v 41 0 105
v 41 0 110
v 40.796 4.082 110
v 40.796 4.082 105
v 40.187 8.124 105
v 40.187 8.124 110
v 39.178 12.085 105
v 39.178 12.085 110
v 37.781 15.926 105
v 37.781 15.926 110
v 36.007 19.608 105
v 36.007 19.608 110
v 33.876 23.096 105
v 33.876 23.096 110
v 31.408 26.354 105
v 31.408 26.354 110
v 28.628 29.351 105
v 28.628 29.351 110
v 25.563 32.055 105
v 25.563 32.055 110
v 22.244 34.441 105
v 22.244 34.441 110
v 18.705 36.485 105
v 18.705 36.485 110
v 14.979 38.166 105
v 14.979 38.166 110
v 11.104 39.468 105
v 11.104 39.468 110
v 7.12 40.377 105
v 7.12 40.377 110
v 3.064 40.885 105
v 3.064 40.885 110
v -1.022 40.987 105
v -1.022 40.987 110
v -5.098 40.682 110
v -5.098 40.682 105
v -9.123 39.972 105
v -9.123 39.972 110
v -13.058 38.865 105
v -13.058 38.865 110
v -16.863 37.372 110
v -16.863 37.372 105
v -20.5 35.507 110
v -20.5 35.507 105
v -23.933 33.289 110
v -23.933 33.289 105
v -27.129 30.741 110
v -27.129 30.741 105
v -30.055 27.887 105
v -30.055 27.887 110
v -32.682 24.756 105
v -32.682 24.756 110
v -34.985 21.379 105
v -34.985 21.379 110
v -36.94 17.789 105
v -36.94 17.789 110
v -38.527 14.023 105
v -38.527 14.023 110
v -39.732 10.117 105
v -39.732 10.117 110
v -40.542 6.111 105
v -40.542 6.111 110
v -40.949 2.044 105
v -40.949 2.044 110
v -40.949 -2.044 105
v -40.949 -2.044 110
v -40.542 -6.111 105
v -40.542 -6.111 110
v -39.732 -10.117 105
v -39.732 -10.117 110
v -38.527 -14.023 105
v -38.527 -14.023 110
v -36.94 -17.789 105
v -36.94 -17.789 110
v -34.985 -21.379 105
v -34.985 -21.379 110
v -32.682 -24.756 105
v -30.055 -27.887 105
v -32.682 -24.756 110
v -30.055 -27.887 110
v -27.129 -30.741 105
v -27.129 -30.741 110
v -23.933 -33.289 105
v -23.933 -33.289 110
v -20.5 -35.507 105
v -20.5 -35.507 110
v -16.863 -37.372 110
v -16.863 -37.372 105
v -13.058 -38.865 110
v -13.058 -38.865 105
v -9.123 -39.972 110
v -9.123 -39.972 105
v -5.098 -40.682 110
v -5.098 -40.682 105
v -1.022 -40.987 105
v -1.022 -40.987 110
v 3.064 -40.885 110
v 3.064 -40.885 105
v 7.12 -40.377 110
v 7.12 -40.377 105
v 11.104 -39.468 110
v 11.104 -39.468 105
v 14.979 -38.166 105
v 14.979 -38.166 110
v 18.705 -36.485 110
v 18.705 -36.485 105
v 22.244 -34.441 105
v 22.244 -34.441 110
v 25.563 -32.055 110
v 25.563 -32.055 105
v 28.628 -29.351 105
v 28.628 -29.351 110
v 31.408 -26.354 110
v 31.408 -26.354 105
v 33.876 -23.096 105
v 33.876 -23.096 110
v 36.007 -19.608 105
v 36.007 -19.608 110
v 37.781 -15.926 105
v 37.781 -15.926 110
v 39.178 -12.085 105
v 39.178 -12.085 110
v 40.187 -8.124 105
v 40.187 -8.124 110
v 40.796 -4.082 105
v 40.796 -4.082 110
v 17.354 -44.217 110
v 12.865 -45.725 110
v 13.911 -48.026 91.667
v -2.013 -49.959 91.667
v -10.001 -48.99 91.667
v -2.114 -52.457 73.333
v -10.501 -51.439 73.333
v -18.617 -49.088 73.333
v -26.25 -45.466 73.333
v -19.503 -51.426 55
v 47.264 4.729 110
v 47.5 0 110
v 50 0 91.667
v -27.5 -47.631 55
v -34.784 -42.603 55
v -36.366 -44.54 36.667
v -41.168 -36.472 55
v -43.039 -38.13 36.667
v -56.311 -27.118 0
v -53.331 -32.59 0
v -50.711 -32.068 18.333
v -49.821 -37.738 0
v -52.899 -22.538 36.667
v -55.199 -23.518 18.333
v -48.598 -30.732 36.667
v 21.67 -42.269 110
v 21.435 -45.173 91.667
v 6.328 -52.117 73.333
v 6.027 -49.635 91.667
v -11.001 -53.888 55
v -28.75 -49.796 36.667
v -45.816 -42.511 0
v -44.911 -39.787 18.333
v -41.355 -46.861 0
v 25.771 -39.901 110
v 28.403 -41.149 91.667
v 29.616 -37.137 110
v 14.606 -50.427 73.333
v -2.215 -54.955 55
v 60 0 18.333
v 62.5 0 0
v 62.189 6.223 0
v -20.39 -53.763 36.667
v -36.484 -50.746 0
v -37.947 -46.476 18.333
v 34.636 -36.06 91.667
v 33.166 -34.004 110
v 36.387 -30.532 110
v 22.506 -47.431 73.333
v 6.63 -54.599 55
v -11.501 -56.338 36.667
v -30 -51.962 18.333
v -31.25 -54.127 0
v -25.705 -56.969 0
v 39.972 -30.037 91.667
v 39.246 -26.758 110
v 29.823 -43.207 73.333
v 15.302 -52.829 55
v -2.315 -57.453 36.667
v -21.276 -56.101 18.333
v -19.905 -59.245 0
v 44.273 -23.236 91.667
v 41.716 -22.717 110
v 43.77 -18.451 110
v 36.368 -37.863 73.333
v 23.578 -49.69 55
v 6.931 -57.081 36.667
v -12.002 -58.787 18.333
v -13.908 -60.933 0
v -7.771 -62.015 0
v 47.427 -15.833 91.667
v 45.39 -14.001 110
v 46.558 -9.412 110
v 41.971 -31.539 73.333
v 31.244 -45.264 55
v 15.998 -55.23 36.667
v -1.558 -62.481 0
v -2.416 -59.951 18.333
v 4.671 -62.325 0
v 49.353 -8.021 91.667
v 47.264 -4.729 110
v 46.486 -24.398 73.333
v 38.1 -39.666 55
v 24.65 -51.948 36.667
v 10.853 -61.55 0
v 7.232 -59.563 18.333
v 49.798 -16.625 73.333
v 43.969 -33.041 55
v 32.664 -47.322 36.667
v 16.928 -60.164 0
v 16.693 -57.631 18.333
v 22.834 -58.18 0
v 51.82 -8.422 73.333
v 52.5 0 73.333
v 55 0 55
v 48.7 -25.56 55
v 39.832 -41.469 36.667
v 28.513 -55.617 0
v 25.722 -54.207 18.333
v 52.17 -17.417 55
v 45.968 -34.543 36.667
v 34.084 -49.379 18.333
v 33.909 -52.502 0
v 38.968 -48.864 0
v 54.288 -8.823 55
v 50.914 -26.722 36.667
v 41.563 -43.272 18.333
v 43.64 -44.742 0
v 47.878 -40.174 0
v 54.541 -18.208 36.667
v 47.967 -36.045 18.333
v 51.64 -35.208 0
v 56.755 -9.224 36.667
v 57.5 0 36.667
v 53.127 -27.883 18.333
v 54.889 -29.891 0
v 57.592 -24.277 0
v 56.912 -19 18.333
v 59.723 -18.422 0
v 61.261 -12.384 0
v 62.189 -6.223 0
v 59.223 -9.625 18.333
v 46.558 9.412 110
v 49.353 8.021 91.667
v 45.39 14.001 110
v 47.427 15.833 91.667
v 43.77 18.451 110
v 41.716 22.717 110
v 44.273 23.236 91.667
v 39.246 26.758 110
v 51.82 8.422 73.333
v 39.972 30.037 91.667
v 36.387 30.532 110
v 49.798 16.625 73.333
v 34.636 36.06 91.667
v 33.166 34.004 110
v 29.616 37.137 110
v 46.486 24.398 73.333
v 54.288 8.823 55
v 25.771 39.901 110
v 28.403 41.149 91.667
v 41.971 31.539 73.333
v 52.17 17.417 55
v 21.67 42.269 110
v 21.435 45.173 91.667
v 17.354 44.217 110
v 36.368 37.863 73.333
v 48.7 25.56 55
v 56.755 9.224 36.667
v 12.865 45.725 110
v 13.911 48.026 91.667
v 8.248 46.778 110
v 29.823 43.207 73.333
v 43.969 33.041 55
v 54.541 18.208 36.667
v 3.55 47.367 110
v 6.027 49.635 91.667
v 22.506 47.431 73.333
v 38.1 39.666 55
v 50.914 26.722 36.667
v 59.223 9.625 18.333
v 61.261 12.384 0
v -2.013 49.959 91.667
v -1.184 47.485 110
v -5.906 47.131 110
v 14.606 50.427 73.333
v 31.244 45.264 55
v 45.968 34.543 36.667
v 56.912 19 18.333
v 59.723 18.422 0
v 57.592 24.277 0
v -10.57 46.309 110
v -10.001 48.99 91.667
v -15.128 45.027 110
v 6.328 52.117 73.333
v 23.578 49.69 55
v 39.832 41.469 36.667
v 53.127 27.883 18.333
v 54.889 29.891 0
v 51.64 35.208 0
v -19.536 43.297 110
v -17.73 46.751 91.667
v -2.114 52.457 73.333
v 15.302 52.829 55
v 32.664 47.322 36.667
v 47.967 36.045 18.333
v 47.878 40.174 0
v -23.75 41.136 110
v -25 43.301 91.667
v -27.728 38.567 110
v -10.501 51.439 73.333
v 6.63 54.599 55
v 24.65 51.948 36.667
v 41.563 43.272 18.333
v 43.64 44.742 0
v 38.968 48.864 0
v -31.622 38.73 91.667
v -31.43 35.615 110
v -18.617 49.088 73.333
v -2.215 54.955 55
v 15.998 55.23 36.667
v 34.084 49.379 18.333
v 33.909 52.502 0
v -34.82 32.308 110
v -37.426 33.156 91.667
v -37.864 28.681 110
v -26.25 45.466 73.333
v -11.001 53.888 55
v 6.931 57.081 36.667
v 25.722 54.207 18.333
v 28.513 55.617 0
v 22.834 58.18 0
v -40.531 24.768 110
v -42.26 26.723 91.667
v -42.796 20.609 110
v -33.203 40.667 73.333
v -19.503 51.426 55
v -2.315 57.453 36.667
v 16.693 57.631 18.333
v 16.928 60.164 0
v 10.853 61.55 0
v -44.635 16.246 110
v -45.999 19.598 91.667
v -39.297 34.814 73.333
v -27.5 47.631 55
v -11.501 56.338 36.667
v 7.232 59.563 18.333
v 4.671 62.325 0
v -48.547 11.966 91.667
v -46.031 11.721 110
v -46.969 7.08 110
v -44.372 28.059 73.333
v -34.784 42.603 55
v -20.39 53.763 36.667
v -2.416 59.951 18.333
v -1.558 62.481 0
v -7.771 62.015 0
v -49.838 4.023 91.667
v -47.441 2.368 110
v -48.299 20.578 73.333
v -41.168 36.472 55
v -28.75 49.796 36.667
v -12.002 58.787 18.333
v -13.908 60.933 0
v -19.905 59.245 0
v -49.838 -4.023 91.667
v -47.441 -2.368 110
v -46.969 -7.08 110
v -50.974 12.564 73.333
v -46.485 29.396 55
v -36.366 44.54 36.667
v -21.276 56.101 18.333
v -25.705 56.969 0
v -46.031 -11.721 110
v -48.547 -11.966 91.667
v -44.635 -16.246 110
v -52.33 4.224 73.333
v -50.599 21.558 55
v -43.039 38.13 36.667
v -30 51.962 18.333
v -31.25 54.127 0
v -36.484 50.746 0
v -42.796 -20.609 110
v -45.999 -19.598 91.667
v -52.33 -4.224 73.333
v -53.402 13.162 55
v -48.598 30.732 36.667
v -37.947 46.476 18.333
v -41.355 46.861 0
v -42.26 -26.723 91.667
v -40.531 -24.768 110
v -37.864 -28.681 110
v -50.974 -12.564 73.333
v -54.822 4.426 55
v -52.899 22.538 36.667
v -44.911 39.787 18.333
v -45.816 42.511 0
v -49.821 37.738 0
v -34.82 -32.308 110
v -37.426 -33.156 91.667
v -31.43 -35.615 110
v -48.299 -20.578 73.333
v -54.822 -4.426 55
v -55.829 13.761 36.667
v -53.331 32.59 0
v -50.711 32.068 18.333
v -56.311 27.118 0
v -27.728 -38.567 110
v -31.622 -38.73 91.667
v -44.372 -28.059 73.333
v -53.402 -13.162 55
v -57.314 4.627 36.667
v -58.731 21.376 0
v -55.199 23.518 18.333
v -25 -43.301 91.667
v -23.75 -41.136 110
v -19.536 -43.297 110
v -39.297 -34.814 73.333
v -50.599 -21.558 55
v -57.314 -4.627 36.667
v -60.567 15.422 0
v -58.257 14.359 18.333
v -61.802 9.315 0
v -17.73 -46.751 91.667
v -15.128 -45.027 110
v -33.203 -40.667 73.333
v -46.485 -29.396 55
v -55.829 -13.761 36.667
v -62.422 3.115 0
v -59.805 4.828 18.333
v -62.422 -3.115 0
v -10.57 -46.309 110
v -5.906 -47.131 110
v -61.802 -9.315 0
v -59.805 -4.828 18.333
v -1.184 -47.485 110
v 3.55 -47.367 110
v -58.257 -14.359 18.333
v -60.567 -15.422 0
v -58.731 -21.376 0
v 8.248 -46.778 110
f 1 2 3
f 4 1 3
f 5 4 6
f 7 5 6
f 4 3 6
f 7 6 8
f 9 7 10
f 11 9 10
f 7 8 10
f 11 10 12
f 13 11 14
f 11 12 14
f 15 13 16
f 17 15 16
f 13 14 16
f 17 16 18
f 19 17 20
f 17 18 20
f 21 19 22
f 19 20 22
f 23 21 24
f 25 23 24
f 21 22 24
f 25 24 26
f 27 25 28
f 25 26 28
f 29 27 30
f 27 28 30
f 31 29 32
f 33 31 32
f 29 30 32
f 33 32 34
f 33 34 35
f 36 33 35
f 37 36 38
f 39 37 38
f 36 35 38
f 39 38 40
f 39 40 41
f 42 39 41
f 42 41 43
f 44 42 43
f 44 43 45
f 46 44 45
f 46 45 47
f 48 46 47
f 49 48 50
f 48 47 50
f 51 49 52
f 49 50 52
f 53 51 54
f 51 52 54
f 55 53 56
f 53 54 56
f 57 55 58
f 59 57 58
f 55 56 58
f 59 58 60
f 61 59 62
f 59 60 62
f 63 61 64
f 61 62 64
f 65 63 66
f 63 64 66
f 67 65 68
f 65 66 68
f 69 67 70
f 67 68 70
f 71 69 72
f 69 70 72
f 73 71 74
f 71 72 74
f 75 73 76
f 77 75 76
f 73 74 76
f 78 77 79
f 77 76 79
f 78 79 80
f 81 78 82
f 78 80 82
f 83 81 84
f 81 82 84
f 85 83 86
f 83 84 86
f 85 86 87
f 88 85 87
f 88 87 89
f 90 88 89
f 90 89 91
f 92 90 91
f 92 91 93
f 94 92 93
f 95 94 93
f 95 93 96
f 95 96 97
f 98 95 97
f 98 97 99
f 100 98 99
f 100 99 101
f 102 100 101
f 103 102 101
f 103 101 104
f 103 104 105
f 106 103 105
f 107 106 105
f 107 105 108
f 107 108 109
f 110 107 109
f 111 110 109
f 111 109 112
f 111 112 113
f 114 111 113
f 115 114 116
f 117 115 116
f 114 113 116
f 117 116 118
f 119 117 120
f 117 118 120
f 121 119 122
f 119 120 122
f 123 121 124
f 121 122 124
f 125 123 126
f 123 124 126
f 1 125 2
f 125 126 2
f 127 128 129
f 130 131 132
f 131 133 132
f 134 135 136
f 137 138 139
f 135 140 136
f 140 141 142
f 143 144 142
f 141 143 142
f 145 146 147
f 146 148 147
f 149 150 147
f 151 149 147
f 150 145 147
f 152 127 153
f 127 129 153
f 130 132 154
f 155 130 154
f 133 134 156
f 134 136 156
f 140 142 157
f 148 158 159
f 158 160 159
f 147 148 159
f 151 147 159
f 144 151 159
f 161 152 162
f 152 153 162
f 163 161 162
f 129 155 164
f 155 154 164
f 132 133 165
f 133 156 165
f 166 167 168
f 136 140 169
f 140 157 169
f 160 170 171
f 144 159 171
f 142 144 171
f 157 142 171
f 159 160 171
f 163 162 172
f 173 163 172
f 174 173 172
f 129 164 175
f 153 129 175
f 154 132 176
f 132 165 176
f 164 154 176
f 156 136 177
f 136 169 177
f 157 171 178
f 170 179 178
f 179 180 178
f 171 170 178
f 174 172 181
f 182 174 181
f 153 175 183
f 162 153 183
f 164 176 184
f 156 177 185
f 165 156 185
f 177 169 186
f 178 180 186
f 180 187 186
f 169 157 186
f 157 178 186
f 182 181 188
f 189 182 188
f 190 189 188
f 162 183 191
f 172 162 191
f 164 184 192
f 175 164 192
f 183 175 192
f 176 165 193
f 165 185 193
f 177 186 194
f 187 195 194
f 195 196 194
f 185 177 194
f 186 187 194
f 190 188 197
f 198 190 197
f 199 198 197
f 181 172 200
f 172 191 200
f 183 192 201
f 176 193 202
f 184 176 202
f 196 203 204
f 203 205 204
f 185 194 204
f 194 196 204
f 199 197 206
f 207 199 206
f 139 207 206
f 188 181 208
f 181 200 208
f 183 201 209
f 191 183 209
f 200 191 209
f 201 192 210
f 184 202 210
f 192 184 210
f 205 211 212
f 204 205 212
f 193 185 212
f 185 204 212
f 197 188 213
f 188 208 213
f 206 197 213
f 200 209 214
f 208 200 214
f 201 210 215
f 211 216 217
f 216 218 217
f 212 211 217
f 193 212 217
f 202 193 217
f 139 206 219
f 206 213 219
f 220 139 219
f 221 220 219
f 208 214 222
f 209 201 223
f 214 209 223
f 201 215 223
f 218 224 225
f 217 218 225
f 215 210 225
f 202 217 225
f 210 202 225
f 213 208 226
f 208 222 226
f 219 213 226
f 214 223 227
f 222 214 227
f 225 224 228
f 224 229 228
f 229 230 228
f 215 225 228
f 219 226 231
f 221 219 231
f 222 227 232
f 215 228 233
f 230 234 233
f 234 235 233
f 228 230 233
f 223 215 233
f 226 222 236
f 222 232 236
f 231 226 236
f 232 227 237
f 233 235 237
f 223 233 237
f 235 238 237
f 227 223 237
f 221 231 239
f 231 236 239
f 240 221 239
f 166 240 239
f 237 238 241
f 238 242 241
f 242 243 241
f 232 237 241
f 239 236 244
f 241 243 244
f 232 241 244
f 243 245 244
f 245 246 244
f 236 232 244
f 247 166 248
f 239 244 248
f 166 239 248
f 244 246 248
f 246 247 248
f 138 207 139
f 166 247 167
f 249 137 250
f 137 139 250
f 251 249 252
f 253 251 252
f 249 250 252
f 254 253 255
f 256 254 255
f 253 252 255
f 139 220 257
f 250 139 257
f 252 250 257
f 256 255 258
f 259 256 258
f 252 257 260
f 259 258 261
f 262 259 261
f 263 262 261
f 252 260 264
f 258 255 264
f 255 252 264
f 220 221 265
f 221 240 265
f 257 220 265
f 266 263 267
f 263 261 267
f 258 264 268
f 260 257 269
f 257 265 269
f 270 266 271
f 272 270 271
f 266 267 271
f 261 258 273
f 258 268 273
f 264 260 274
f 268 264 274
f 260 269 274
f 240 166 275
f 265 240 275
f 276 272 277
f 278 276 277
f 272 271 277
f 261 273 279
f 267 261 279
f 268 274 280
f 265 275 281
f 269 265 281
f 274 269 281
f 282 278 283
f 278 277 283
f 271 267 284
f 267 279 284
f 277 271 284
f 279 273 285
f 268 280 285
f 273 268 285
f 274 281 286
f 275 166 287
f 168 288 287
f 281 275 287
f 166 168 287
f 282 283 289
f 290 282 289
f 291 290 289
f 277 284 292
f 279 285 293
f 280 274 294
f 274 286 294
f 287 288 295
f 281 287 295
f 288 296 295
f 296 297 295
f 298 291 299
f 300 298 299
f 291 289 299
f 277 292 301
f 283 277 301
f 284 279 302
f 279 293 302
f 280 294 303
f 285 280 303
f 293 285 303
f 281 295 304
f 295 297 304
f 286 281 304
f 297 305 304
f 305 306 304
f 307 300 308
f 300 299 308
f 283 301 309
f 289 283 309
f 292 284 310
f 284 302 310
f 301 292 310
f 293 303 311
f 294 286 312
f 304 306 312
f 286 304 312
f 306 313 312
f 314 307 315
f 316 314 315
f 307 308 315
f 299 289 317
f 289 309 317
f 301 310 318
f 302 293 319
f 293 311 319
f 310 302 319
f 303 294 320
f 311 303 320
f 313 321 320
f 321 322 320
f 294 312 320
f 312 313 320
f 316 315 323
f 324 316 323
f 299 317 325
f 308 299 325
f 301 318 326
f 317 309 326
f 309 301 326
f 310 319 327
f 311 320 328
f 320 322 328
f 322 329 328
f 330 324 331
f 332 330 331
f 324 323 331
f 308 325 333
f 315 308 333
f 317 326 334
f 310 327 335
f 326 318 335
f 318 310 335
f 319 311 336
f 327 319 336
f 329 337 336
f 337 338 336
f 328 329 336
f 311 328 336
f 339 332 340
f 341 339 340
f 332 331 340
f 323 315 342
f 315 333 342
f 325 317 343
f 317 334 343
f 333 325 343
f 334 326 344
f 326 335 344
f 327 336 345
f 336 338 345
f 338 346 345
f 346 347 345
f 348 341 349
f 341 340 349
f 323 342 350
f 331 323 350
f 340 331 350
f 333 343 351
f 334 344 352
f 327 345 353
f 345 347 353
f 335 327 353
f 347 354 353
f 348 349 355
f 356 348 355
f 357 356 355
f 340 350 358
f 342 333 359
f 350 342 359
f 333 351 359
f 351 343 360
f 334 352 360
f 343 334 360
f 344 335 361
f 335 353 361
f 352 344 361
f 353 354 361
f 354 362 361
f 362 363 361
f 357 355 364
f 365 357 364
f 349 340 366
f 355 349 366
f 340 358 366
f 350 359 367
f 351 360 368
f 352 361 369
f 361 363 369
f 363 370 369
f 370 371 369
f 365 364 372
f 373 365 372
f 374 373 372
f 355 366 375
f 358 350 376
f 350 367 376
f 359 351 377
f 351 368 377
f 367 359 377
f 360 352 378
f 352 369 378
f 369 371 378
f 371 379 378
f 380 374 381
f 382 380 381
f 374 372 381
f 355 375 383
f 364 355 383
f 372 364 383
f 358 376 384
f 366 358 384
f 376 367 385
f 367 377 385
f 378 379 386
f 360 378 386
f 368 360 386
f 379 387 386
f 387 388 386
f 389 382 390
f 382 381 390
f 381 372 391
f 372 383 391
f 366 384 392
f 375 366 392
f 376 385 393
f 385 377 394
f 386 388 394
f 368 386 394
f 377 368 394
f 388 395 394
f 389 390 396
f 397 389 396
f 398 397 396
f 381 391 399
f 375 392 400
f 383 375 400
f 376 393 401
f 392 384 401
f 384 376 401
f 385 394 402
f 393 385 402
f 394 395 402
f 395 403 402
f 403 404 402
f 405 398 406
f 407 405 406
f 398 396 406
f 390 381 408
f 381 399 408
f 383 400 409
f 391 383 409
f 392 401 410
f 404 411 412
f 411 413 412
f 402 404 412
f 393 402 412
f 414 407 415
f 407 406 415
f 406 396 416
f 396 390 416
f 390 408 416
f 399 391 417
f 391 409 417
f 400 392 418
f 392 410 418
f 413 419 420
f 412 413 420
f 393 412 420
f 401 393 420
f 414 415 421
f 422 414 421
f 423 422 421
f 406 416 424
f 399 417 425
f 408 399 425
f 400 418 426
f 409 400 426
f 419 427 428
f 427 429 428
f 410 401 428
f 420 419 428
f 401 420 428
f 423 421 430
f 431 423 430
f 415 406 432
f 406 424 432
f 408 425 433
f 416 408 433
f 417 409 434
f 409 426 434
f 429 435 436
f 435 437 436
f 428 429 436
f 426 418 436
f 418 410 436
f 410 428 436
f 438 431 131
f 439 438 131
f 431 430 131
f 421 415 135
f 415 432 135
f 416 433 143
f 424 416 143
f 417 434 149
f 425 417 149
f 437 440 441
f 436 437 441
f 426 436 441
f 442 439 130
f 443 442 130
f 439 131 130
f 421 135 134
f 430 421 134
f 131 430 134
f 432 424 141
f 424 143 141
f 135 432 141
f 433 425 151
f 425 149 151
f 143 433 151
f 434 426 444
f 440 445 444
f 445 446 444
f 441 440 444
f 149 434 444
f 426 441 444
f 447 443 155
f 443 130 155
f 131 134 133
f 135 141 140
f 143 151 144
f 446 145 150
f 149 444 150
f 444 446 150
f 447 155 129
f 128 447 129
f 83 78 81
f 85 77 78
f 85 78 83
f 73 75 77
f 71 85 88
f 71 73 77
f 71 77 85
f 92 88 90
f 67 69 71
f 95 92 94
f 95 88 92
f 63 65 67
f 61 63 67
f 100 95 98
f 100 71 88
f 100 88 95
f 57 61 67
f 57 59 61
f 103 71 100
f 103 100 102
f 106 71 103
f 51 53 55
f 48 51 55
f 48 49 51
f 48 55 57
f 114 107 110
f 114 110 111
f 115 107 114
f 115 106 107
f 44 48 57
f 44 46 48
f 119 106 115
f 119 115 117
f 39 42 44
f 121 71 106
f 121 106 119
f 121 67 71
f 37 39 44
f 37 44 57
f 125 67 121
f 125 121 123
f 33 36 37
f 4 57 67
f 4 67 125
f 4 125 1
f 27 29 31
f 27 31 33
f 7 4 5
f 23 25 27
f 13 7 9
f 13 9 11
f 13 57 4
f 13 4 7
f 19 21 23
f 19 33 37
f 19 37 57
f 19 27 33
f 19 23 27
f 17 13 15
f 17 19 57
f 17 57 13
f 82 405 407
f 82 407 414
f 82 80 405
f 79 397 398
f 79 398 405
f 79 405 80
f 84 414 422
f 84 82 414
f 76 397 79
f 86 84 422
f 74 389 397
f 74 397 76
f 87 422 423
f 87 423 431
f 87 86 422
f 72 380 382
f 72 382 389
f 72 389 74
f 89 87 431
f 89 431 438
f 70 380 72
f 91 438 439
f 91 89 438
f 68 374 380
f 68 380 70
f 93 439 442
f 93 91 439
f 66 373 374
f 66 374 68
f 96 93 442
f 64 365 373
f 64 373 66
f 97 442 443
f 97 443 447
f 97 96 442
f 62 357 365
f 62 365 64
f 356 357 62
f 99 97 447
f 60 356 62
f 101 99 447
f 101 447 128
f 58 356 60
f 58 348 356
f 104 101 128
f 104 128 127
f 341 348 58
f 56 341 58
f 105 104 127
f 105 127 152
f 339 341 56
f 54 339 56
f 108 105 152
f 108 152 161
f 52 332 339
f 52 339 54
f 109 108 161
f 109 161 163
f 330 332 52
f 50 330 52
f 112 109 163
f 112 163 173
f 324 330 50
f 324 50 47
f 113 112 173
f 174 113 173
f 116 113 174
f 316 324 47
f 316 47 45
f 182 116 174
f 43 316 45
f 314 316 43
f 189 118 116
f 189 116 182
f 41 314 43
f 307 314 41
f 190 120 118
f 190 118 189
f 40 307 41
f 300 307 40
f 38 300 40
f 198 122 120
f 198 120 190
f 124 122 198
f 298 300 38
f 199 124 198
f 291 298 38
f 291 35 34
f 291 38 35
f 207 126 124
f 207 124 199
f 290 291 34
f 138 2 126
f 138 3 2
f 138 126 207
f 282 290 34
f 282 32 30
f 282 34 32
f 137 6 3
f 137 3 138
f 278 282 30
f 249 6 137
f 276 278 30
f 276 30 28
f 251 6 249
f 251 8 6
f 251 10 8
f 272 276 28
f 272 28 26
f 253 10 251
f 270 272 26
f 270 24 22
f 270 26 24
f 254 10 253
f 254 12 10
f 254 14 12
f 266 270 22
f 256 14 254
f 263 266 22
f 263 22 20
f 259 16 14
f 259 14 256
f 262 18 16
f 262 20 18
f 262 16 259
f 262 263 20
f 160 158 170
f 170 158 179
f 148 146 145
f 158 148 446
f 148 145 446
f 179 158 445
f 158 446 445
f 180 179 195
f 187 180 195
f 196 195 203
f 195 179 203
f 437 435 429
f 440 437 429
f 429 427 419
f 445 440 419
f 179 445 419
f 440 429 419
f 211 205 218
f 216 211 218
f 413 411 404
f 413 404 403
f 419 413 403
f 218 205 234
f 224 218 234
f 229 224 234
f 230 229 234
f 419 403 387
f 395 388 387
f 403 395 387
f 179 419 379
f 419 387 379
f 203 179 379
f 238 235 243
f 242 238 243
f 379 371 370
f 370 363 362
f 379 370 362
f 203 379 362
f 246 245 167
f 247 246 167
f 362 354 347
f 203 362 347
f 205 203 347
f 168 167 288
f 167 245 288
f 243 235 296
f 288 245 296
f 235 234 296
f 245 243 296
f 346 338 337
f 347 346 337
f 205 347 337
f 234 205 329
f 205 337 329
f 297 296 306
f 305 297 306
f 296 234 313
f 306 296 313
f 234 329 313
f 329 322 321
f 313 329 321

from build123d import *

# Parameters (mm, degrees)
F0_R     = 62.5
F1_DEPTH = 110
F2_SIZE2 = 109.99999
F2_SIZE  = 14.99999
F3_R     = 41
F4_DEPTH = 5


# Not quite as in the source:
# - a fillet or chamfer is up to 0.001 mm smaller than in the source, because OpenCascade refuses the exact size


with BuildPart() as f1:
    # F0 (on Top) → F1 (new body)
    with BuildSketch(Plane.XY):
        Circle(F0_R)
    extrude(amount=F1_DEPTH)

    # F2 (size 15 and 110 in the source; OpenCascade refuses exactly that, so slightly less here)
    f2_edges = [f1.edges().sort_by_distance(p)[0] for p in [
        (-62.5, 0, 110),
    ]]
    f2_side = f1.faces().sort_by_distance((0, 0, 110))[0]
    chamfer(f2_edges, length=F2_SIZE, length2=F2_SIZE2, reference=f2_side)

    # F3 (on face) → F4 (cut)
    with BuildSketch(Plane.XY.offset(110)):
        Circle(F3_R)
    extrude(amount=-F4_DEPTH, mode=Mode.SUBTRACT)


solid = f1.part
